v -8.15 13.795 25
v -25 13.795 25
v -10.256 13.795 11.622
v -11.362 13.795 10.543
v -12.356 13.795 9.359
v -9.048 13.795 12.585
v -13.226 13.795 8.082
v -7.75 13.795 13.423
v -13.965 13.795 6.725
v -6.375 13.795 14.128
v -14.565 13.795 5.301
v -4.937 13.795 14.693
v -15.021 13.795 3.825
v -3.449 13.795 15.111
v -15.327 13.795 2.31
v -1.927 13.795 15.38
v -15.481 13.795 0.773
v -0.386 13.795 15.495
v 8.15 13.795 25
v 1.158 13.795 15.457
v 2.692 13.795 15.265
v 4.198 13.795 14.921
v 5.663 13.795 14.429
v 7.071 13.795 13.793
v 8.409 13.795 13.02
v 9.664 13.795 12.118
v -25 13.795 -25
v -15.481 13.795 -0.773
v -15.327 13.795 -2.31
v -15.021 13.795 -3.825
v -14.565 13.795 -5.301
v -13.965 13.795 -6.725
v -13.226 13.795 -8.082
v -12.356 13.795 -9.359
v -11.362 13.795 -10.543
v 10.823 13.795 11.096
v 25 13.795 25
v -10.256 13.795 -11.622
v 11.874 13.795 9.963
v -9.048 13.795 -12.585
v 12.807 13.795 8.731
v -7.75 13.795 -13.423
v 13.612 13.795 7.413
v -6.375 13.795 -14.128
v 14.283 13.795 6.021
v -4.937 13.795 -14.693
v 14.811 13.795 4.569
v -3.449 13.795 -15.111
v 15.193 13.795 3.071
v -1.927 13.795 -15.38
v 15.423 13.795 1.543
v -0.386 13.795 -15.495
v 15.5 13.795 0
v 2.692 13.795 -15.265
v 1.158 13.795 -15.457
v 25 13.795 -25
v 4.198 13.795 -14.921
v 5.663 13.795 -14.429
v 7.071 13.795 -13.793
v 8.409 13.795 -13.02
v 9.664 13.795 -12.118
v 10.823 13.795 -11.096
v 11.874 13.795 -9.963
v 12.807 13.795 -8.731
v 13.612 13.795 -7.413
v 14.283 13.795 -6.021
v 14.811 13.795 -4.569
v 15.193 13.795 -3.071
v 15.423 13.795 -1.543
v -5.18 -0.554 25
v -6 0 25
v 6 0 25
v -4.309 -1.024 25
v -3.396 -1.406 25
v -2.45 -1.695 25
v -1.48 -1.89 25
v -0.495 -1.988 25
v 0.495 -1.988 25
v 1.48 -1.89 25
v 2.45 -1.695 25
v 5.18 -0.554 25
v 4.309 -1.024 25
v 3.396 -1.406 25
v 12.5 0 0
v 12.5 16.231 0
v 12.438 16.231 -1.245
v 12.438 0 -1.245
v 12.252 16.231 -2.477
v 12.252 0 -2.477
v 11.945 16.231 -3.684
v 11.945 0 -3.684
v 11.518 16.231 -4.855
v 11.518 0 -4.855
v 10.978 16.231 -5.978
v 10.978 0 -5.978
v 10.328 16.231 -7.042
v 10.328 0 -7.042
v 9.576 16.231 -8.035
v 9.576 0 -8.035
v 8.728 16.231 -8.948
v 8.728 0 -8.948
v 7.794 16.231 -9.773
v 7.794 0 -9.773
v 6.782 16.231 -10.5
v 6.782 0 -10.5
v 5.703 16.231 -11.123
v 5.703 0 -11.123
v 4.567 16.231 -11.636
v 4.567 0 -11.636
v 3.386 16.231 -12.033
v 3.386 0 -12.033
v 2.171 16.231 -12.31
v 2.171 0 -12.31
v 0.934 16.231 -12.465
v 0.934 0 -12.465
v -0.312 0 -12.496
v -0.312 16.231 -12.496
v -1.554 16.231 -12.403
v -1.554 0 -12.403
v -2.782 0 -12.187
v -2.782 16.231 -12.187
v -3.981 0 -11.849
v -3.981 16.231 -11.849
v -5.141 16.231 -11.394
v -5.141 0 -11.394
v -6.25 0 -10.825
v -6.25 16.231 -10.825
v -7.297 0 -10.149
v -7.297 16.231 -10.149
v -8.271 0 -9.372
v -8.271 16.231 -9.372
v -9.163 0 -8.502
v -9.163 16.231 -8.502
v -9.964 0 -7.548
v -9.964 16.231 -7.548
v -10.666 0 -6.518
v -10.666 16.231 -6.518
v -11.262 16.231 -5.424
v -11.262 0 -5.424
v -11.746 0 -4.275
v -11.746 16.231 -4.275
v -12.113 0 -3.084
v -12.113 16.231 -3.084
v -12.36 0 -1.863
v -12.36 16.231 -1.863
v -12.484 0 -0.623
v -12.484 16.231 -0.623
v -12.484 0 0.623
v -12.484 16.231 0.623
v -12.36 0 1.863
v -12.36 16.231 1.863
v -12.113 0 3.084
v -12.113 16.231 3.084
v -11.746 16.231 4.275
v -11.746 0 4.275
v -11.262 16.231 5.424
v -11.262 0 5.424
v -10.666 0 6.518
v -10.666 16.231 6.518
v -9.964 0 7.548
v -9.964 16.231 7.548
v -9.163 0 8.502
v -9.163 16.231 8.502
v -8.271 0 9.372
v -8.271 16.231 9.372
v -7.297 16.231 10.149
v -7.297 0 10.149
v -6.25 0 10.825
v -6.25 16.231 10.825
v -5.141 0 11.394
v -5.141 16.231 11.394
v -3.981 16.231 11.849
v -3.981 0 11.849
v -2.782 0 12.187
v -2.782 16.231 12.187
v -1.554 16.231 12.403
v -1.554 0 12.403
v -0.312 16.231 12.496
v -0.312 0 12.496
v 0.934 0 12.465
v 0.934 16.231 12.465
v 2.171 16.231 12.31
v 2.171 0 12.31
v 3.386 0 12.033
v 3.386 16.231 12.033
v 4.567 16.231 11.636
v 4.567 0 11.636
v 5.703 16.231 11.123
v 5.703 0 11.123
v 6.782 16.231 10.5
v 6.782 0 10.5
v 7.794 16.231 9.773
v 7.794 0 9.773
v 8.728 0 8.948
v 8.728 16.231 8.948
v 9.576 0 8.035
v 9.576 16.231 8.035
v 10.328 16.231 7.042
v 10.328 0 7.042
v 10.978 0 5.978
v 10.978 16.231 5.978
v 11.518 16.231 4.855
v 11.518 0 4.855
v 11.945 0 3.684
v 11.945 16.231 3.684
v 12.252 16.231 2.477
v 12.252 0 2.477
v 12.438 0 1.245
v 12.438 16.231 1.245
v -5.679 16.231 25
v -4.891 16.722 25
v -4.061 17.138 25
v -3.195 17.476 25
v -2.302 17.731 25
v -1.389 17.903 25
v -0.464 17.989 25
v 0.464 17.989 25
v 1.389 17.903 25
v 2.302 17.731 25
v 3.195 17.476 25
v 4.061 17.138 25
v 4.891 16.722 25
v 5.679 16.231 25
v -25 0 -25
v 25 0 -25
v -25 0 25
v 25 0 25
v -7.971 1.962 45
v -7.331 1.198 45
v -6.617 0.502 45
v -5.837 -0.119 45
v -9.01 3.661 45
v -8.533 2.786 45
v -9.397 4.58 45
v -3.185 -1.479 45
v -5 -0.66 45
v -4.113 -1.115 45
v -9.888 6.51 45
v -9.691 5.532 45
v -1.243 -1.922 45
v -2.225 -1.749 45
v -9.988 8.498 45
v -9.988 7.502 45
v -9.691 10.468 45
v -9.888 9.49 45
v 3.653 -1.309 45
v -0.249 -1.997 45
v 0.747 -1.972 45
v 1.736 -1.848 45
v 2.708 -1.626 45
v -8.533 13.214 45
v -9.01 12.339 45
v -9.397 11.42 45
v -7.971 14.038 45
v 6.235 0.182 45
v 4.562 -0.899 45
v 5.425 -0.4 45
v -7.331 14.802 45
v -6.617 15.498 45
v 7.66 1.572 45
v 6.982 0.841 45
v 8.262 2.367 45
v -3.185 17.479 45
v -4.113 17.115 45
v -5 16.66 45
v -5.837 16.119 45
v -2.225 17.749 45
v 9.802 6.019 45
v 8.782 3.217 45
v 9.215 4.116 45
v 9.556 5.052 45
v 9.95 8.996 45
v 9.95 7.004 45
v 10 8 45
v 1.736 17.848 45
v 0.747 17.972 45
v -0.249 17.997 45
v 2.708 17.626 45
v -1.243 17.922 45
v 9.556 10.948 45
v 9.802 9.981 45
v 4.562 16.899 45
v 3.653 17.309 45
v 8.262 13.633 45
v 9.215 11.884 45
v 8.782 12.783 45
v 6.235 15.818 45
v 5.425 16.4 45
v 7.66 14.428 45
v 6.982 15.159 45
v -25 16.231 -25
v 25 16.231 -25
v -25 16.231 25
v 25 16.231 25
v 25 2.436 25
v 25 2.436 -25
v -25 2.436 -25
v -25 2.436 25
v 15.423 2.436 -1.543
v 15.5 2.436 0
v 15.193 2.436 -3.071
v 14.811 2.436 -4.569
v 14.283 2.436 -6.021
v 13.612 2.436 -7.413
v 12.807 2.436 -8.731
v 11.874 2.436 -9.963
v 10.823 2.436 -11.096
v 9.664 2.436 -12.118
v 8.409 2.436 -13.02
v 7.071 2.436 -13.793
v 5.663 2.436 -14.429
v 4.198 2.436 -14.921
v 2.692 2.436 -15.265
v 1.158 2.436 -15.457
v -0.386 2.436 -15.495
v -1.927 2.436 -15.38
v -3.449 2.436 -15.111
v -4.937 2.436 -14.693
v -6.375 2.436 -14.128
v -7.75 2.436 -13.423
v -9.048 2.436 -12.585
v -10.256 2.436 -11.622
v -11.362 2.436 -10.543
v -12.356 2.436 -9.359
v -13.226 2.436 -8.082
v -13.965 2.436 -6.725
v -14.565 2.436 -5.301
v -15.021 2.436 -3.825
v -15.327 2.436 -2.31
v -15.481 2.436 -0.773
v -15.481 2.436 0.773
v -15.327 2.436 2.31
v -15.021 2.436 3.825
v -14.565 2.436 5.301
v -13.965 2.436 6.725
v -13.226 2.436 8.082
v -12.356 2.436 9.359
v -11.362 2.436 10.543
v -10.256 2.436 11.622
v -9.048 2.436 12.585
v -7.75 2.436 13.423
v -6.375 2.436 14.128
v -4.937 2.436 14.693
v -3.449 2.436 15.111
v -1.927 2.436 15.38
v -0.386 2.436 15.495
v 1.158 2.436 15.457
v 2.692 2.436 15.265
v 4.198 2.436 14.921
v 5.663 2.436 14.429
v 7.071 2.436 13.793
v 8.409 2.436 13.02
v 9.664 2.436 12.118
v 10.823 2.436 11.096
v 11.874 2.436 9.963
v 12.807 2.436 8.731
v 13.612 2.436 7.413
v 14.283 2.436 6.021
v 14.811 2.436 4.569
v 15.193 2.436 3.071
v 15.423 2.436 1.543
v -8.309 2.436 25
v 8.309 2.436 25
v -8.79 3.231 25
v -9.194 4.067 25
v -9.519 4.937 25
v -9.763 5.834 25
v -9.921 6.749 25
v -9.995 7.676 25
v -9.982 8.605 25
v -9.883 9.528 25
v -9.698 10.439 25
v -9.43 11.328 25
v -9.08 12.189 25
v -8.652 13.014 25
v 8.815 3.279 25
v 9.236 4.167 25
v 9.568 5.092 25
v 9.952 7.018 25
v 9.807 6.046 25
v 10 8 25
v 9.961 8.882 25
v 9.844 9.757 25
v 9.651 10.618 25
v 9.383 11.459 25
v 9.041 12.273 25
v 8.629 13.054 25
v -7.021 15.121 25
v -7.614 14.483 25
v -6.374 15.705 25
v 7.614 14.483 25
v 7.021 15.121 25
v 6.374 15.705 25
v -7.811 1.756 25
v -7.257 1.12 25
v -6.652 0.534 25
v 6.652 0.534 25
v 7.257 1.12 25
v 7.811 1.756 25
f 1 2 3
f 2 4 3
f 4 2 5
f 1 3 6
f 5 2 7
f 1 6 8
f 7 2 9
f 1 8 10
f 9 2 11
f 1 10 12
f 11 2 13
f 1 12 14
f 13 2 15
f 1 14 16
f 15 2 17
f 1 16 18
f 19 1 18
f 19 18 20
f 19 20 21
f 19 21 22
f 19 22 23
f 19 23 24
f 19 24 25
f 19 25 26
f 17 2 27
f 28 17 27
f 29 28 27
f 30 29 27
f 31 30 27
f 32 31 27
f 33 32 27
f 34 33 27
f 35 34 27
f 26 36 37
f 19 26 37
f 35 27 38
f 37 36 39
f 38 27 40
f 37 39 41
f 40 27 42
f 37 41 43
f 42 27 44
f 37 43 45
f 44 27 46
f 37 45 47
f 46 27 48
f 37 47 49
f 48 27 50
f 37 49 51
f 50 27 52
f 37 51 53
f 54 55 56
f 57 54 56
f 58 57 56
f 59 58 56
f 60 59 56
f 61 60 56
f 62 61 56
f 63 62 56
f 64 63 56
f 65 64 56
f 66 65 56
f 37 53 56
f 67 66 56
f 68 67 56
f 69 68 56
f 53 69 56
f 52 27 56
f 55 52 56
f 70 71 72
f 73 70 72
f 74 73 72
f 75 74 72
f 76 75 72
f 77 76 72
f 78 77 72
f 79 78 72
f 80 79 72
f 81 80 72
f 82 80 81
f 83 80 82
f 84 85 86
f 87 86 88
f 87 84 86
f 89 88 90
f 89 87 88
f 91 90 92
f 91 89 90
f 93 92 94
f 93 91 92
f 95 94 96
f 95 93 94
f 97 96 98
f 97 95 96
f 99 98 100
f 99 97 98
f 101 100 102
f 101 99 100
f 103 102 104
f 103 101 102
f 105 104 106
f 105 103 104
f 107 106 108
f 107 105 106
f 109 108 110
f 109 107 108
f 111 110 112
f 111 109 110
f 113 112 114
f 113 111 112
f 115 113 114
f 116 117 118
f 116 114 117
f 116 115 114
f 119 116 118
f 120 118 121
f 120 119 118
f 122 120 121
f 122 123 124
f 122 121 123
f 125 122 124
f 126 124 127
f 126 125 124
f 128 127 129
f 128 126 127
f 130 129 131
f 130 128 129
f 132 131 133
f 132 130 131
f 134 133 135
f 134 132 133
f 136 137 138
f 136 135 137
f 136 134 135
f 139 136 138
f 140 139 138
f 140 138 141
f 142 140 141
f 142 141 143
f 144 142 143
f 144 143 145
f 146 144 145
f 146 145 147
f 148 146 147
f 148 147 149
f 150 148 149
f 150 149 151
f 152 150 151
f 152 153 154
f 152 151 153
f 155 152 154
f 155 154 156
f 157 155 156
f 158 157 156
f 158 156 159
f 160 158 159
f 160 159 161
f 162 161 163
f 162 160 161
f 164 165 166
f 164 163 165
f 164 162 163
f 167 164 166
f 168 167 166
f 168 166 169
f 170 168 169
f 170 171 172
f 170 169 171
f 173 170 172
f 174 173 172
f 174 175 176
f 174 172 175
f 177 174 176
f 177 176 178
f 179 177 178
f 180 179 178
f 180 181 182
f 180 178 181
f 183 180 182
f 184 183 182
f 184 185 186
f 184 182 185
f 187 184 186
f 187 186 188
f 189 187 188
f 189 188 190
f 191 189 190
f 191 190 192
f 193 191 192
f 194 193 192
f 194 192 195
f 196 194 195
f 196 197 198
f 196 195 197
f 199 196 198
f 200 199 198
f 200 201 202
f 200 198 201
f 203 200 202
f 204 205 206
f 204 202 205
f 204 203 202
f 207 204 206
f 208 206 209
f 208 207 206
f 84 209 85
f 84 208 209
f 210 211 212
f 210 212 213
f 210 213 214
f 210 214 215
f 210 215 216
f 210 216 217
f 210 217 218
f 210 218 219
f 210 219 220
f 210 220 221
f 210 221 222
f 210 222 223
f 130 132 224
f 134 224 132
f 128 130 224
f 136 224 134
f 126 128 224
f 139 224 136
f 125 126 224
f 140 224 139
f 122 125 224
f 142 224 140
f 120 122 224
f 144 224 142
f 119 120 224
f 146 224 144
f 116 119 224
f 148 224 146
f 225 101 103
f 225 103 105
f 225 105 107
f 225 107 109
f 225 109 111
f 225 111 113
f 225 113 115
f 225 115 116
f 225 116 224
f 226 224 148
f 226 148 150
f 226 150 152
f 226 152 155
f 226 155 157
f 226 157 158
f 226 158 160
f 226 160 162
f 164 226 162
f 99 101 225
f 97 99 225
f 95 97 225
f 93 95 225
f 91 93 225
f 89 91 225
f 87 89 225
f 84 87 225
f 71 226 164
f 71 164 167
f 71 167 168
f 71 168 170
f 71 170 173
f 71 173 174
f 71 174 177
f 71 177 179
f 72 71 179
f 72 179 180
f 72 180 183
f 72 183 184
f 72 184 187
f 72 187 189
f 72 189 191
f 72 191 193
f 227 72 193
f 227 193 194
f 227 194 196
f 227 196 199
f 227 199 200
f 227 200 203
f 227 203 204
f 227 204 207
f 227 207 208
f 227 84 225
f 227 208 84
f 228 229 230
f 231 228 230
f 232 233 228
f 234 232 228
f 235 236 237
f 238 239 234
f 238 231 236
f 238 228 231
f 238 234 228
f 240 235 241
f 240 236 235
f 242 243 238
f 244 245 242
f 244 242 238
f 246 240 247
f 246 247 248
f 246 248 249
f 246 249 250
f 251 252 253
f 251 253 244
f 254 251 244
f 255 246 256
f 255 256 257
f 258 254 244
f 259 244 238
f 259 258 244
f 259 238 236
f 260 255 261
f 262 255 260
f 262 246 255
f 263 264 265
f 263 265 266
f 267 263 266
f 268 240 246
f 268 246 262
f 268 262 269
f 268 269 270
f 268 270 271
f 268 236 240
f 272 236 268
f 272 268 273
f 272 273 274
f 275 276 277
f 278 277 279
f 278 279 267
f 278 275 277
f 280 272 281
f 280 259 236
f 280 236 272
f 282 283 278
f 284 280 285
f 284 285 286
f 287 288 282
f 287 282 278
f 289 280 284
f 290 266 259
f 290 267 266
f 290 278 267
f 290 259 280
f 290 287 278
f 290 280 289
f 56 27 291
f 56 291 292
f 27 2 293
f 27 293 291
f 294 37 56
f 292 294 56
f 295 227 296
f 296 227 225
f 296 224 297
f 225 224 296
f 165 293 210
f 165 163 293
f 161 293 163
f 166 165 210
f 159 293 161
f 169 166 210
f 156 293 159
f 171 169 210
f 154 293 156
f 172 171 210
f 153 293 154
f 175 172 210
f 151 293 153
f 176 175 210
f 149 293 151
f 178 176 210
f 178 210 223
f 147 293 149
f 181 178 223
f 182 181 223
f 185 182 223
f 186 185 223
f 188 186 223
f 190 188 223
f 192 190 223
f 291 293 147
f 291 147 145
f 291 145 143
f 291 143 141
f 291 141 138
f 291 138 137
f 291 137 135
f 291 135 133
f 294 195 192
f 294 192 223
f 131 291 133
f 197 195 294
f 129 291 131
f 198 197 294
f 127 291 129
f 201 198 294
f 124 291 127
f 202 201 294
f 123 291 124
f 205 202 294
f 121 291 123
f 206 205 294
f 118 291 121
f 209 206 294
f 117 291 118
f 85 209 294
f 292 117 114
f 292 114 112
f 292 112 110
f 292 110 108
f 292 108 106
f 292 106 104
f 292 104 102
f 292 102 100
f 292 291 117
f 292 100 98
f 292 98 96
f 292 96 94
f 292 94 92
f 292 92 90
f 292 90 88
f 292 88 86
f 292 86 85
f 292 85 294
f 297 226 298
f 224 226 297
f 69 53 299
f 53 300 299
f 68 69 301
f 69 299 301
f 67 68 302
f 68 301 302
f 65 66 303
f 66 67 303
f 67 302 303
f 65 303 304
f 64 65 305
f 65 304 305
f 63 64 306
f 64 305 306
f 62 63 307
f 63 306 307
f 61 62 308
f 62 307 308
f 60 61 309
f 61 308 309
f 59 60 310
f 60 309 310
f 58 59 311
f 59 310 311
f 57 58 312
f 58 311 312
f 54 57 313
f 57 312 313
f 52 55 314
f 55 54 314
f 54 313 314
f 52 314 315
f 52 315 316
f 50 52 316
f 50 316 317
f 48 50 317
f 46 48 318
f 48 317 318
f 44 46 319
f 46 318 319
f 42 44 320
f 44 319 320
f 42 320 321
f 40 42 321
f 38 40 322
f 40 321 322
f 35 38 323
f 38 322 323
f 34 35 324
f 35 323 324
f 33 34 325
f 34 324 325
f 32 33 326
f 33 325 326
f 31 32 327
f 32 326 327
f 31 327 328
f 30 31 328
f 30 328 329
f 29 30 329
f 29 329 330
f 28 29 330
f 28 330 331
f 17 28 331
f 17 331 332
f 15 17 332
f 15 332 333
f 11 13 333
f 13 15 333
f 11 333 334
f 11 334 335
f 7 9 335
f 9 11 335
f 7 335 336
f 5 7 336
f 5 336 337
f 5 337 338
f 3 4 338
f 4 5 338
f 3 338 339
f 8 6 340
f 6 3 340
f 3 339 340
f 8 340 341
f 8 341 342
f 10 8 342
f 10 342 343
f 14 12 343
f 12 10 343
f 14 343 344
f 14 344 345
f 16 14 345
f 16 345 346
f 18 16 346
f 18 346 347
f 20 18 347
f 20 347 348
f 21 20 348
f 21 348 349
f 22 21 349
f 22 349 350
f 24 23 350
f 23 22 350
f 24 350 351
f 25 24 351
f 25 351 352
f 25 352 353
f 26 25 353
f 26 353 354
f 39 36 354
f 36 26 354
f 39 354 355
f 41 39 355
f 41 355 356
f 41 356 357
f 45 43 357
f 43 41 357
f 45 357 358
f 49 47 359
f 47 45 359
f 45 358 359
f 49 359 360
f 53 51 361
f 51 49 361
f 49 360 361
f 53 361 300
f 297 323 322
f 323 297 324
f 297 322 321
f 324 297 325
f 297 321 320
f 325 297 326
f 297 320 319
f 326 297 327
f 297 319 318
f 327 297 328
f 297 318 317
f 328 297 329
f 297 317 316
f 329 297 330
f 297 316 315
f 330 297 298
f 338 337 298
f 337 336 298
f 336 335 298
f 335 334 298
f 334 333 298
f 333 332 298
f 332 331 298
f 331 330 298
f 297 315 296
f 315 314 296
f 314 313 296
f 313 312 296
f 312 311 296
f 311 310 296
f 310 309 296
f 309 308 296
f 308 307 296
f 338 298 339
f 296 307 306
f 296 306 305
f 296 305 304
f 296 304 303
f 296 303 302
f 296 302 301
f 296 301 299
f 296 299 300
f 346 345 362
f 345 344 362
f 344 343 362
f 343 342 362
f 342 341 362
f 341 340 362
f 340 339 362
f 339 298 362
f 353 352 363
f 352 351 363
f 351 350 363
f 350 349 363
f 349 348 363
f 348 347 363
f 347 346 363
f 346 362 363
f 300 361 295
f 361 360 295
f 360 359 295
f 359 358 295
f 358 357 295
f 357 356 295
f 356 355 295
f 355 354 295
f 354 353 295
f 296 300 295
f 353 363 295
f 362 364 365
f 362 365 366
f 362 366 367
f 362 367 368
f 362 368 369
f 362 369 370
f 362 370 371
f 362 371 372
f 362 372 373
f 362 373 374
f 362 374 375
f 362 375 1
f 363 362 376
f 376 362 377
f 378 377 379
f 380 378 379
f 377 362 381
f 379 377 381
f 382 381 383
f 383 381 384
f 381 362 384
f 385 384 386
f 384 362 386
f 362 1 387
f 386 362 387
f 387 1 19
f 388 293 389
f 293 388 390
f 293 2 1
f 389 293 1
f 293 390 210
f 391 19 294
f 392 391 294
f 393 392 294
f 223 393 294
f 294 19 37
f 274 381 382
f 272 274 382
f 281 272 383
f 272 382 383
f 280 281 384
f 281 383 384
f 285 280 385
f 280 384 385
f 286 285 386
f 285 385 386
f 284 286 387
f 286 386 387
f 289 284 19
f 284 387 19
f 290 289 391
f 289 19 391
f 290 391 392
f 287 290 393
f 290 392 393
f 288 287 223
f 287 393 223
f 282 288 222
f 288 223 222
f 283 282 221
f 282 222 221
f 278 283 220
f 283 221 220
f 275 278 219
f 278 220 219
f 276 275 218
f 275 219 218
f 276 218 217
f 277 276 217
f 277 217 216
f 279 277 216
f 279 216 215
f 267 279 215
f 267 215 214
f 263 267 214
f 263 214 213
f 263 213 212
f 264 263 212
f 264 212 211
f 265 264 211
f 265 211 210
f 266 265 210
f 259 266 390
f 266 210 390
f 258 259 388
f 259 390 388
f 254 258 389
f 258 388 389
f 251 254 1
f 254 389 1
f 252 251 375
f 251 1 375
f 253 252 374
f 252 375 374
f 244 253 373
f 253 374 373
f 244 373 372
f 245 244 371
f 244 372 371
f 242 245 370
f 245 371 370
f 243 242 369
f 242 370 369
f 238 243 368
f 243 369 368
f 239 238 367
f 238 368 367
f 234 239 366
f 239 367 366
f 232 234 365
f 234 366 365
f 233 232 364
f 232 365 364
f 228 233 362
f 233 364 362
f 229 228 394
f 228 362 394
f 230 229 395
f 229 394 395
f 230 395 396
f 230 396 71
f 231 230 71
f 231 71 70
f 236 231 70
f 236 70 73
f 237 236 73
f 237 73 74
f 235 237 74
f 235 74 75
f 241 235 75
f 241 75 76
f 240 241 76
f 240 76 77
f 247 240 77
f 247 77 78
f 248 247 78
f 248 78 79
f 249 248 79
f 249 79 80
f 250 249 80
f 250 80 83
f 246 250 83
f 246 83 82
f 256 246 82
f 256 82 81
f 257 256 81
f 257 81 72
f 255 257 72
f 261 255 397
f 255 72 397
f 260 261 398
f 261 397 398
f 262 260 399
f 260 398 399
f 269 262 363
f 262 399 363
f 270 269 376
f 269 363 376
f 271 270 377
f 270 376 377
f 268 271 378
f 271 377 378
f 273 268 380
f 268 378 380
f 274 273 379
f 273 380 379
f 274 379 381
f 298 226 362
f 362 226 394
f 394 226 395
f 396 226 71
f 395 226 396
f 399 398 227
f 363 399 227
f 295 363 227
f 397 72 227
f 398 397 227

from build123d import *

# Parameters (mm, degrees)
SKETCH1_R                = 15.5
SKETCH1_R_2              = 12.5
BOSS_EXTRUDE1_DEPTH      = 15
BOSS_EXTRUDE2_DEPTH      = 50
BOSS_EXTRUDE2_DEPTH_BACK = 50
SKETCH2_W                = 100
SKETCH2_H                = 2.435831537
SKETCH2_H_2              = 2.435831538
SKETCH1_4_R              = 12.5
CUT_EXTRUDE1_DEPTH       = 20
SKETCH1_7_R              = 100
SKETCH1_7_W              = 50
SKETCH1_7_H              = 50
CUT_EXTRUDE2_DEPTH       = 20
SKETCH4_R                = 10
BOSS_EXTRUDE3_DEPTH      = 20


with BuildPart() as part:
    # Sketch1 → Boss-Extrude1 (new body)
    with BuildSketch(Plane(origin=(0, 0, 0), x_dir=(1, 0, 0), z_dir=(0, 1, 0))):
        Circle(SKETCH1_R)
        Circle(SKETCH1_R_2, mode=Mode.SUBTRACT)
    extrude(amount=BOSS_EXTRUDE1_DEPTH)

    # Sketch2 → Boss-Extrude2 (add, two sides: drawn at the far end of the back side and taken through both)
    with BuildSketch(Plane.XY.offset(-BOSS_EXTRUDE2_DEPTH_BACK)):
        with Locations((0, 1.217915769)):
            Rectangle(SKETCH2_W, SKETCH2_H)
        with Locations((0, 15.01290923)):
            Rectangle(SKETCH2_W, SKETCH2_H_2)
    extrude(amount=BOSS_EXTRUDE2_DEPTH + BOSS_EXTRUDE2_DEPTH_BACK)

    # Sketch1<4> → Cut-Extrude1 (cut)
    with BuildSketch(Plane(origin=(0, 0, 0), x_dir=(1, 0, 0), z_dir=(0, 1, 0))):
        Circle(SKETCH1_4_R)
    extrude(amount=CUT_EXTRUDE1_DEPTH, mode=Mode.SUBTRACT)

    # Sketch1<7> → Cut-Extrude2 (cut)
    with BuildSketch(Plane(origin=(0, 0, 0), x_dir=(1, 0, 0), z_dir=(0, 1, 0))):
        Circle(SKETCH1_7_R)
        Rectangle(SKETCH1_7_W, SKETCH1_7_H, mode=Mode.SUBTRACT)
    extrude(amount=CUT_EXTRUDE2_DEPTH, mode=Mode.SUBTRACT)

    # Sketch4 → Boss-Extrude3 (add)
    with BuildSketch(Plane.XY.offset(25)):
        with Locations((0, 8)):
            Circle(SKETCH4_R)
    extrude(amount=BOSS_EXTRUDE3_DEPTH)


solid = part.part
